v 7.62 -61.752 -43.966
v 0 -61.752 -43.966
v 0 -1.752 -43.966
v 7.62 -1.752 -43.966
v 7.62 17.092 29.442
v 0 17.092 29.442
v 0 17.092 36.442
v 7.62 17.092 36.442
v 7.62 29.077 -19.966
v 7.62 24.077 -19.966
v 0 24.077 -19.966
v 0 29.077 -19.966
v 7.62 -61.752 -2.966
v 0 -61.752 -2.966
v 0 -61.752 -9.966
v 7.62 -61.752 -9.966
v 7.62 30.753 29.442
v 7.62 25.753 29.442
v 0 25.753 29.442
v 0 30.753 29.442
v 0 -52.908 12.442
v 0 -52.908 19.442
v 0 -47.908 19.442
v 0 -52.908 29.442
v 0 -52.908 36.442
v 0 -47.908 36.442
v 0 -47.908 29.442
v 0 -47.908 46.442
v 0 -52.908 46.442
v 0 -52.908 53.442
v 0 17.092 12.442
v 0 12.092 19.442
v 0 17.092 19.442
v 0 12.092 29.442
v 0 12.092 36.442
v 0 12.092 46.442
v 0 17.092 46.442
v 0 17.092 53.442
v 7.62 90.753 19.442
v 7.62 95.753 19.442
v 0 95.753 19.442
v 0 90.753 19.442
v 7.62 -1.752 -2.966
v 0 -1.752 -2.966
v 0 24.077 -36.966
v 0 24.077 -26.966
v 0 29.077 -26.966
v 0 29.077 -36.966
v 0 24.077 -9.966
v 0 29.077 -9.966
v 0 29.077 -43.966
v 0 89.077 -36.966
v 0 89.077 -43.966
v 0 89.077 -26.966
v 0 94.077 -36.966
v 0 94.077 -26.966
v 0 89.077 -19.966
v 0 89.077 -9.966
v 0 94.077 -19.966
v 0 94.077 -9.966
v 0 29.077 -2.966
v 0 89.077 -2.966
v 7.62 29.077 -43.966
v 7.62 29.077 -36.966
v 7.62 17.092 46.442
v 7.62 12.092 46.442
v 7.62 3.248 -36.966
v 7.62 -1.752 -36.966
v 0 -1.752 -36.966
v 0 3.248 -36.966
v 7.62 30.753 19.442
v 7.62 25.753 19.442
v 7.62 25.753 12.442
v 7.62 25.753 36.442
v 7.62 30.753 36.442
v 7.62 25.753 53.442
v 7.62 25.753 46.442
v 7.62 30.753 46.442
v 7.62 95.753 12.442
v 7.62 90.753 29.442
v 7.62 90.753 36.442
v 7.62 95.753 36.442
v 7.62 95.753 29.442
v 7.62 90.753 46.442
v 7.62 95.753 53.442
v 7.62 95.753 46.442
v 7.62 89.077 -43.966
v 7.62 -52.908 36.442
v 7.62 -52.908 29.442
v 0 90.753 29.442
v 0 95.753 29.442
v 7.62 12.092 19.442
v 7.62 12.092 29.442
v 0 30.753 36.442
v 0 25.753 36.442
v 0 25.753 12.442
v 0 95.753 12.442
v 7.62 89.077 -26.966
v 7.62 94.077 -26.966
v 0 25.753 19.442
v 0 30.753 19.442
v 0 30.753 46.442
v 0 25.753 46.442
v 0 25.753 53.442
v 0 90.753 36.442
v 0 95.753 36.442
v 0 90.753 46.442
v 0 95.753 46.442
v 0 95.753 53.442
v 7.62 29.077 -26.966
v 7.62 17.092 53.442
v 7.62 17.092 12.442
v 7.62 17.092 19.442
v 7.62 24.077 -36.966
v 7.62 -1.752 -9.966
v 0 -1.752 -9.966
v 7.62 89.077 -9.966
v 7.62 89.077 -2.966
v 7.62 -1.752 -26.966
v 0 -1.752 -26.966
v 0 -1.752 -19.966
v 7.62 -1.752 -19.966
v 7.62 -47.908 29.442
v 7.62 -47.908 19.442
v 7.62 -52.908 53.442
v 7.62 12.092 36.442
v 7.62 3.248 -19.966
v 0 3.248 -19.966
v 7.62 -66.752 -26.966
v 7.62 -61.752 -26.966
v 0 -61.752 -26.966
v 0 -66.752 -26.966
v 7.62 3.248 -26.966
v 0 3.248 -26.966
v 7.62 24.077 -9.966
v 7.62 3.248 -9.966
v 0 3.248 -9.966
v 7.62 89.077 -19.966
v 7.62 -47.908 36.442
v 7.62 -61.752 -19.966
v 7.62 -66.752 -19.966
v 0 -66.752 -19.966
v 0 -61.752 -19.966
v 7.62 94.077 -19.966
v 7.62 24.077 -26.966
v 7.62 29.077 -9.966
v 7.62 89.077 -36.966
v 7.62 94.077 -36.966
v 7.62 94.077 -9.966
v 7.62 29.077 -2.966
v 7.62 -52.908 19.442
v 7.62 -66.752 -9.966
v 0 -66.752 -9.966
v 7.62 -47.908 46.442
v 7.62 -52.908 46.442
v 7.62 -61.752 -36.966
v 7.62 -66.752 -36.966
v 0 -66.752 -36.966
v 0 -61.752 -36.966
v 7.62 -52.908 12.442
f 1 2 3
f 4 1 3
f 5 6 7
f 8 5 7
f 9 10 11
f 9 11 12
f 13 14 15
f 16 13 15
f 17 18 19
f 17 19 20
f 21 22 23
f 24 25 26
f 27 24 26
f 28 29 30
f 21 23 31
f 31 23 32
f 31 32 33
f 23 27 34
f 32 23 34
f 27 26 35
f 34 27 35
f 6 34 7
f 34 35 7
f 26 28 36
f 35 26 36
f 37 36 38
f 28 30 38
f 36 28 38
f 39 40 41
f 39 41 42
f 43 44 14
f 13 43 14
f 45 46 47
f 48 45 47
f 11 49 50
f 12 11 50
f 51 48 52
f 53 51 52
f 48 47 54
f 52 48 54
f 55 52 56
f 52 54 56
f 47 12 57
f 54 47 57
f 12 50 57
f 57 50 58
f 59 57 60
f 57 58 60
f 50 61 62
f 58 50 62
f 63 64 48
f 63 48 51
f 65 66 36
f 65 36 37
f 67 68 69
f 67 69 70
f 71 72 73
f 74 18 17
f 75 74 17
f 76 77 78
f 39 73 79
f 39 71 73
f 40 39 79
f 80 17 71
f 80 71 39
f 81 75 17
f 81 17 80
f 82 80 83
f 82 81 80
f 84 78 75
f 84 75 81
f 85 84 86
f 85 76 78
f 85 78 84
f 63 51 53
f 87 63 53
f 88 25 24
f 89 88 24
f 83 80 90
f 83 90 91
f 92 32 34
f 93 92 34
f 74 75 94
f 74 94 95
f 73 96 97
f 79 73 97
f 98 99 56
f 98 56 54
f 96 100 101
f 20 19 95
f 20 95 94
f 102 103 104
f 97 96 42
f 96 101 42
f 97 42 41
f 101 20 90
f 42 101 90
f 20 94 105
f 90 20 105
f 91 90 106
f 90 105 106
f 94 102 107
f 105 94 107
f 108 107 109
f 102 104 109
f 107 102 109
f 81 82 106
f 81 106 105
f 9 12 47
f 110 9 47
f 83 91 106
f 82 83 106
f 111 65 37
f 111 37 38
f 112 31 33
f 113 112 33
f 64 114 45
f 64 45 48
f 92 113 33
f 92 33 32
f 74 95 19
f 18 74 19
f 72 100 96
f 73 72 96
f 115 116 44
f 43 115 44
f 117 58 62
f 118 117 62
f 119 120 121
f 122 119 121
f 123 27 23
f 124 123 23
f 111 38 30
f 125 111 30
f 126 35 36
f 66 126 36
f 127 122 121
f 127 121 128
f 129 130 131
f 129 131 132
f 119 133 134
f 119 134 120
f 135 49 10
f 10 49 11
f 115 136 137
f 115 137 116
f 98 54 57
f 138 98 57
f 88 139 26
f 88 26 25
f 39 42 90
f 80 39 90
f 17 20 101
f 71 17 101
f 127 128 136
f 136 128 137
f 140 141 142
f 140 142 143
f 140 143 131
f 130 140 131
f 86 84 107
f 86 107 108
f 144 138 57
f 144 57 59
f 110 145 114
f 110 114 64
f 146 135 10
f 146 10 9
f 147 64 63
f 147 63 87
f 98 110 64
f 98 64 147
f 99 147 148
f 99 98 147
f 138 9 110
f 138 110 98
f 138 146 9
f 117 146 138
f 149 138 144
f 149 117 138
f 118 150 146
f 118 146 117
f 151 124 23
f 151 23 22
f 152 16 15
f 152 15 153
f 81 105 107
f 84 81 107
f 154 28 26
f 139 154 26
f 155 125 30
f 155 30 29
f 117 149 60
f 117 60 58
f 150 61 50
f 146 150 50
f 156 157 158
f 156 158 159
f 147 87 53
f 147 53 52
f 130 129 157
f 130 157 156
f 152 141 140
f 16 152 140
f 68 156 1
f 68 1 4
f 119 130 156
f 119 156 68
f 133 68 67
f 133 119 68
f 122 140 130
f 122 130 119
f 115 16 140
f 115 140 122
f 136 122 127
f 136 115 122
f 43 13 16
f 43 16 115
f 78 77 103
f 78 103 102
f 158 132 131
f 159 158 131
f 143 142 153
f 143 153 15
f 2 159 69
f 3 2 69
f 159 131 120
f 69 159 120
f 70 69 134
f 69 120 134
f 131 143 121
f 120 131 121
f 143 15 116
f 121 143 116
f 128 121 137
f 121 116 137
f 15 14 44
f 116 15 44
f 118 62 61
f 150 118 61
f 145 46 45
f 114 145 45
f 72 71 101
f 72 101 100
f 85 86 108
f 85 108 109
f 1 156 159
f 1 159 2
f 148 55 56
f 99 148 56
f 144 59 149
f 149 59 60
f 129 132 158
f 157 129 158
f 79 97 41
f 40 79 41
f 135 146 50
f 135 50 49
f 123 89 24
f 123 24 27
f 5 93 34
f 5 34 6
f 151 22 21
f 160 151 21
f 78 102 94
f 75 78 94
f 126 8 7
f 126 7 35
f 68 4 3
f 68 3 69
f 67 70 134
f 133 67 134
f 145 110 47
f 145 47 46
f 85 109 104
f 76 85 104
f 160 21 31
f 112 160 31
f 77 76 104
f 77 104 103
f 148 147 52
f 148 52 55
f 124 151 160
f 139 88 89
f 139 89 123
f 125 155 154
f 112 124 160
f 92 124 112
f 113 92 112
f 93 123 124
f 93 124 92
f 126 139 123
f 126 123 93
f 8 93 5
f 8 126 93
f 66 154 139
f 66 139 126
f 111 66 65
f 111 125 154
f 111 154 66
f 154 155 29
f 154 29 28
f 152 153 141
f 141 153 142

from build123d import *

# Parameters (mm, degrees)
F2_DEPTH = 6.096
F3_DEPTH = 7.62


with BuildPart() as f2:
    # F0 (on Right) → F2 (new body)
    with BuildSketch(Plane.YZ):
        Polygon((-1.752106, -2.966015), (-61.752106, -2.966015), (-61.752106, -9.966015), (-66.752106, -9.966015), (-66.752106, -19.966015), (-61.752106, -19.966015), (-61.752106, -26.966015), (-66.752106, -26.966015), (-66.752106, -36.966015), (-61.752106, -36.966015), (-61.752106, -43.966015), (-1.752106, -43.966015), (-1.752106, -36.966015), (3.247894, -36.966015), (3.247894, -26.966015), (-1.752106, -26.966015), (-1.752106, -19.966015), (3.247894, -19.966015), (3.247894, -9.966015), (-1.752106, -9.966015), align=None)
    extrude(amount=F2_DEPTH)

    # F0 (on Right) → F3 (join)
    with BuildSketch(Plane.YZ):
        Polygon((17.091769, 46.442319), (17.091769, 53.442319), (-52.908231, 53.442319), (-52.908231, 46.442319), (-47.908231, 46.442319), (-47.908231, 36.442319), (-52.908231, 36.442319), (-52.908231, 29.442319), (-47.908231, 29.442319), (-47.908231, 19.442319), (-52.908231, 19.442319), (-52.908231, 12.442319), (17.091769, 12.442319), (17.091769, 19.442319), (12.091769, 19.442319), (12.091769, 29.442319), (17.091769, 29.442319), (17.091769, 36.442319), (12.091769, 36.442319), (12.091769, 46.442319), align=None)
        Polygon((30.75294, 36.442319), (25.75294, 36.442319), (25.75294, 29.442319), (30.75294, 29.442319), (30.75294, 19.442319), (25.75294, 19.442319), (25.75294, 12.442319), (95.75294, 12.442319), (95.75294, 19.442319), (90.75294, 19.442319), (90.75294, 29.442319), (95.75294, 29.442319), (95.75294, 36.442319), (90.75294, 36.442319), (90.75294, 46.442319), (95.75294, 46.442319), (95.75294, 53.442319), (25.75294, 53.442319), (25.75294, 46.442319), (30.75294, 46.442319), align=None)
        Polygon((-1.752106, -2.966015), (-61.752106, -2.966015), (-61.752106, -9.966015), (-66.752106, -9.966015), (-66.752106, -19.966015), (-61.752106, -19.966015), (-61.752106, -26.966015), (-66.752106, -26.966015), (-66.752106, -36.966015), (-61.752106, -36.966015), (-61.752106, -43.966015), (-1.752106, -43.966015), (-1.752106, -36.966015), (3.247894, -36.966015), (3.247894, -26.966015), (-1.752106, -26.966015), (-1.752106, -19.966015), (3.247894, -19.966015), (3.247894, -9.966015), (-1.752106, -9.966015), align=None)
        Polygon((89.076876, -9.966015), (89.076876, -2.966015), (29.076876, -2.966015), (29.076876, -9.966015), (24.076876, -9.966015), (24.076876, -19.966015), (29.076876, -19.966015), (29.076876, -26.966015), (24.076876, -26.966015), (24.076876, -36.966015), (29.076876, -36.966015), (29.076876, -43.966015), (89.076876, -43.966015), (89.076876, -36.966015), (94.076876, -36.966015), (94.076876, -26.966015), (89.076876, -26.966015), (89.076876, -19.966015), (94.076876, -19.966015), (94.076876, -9.966015), align=None)
    extrude(amount=F3_DEPTH)


solid = f2.part
